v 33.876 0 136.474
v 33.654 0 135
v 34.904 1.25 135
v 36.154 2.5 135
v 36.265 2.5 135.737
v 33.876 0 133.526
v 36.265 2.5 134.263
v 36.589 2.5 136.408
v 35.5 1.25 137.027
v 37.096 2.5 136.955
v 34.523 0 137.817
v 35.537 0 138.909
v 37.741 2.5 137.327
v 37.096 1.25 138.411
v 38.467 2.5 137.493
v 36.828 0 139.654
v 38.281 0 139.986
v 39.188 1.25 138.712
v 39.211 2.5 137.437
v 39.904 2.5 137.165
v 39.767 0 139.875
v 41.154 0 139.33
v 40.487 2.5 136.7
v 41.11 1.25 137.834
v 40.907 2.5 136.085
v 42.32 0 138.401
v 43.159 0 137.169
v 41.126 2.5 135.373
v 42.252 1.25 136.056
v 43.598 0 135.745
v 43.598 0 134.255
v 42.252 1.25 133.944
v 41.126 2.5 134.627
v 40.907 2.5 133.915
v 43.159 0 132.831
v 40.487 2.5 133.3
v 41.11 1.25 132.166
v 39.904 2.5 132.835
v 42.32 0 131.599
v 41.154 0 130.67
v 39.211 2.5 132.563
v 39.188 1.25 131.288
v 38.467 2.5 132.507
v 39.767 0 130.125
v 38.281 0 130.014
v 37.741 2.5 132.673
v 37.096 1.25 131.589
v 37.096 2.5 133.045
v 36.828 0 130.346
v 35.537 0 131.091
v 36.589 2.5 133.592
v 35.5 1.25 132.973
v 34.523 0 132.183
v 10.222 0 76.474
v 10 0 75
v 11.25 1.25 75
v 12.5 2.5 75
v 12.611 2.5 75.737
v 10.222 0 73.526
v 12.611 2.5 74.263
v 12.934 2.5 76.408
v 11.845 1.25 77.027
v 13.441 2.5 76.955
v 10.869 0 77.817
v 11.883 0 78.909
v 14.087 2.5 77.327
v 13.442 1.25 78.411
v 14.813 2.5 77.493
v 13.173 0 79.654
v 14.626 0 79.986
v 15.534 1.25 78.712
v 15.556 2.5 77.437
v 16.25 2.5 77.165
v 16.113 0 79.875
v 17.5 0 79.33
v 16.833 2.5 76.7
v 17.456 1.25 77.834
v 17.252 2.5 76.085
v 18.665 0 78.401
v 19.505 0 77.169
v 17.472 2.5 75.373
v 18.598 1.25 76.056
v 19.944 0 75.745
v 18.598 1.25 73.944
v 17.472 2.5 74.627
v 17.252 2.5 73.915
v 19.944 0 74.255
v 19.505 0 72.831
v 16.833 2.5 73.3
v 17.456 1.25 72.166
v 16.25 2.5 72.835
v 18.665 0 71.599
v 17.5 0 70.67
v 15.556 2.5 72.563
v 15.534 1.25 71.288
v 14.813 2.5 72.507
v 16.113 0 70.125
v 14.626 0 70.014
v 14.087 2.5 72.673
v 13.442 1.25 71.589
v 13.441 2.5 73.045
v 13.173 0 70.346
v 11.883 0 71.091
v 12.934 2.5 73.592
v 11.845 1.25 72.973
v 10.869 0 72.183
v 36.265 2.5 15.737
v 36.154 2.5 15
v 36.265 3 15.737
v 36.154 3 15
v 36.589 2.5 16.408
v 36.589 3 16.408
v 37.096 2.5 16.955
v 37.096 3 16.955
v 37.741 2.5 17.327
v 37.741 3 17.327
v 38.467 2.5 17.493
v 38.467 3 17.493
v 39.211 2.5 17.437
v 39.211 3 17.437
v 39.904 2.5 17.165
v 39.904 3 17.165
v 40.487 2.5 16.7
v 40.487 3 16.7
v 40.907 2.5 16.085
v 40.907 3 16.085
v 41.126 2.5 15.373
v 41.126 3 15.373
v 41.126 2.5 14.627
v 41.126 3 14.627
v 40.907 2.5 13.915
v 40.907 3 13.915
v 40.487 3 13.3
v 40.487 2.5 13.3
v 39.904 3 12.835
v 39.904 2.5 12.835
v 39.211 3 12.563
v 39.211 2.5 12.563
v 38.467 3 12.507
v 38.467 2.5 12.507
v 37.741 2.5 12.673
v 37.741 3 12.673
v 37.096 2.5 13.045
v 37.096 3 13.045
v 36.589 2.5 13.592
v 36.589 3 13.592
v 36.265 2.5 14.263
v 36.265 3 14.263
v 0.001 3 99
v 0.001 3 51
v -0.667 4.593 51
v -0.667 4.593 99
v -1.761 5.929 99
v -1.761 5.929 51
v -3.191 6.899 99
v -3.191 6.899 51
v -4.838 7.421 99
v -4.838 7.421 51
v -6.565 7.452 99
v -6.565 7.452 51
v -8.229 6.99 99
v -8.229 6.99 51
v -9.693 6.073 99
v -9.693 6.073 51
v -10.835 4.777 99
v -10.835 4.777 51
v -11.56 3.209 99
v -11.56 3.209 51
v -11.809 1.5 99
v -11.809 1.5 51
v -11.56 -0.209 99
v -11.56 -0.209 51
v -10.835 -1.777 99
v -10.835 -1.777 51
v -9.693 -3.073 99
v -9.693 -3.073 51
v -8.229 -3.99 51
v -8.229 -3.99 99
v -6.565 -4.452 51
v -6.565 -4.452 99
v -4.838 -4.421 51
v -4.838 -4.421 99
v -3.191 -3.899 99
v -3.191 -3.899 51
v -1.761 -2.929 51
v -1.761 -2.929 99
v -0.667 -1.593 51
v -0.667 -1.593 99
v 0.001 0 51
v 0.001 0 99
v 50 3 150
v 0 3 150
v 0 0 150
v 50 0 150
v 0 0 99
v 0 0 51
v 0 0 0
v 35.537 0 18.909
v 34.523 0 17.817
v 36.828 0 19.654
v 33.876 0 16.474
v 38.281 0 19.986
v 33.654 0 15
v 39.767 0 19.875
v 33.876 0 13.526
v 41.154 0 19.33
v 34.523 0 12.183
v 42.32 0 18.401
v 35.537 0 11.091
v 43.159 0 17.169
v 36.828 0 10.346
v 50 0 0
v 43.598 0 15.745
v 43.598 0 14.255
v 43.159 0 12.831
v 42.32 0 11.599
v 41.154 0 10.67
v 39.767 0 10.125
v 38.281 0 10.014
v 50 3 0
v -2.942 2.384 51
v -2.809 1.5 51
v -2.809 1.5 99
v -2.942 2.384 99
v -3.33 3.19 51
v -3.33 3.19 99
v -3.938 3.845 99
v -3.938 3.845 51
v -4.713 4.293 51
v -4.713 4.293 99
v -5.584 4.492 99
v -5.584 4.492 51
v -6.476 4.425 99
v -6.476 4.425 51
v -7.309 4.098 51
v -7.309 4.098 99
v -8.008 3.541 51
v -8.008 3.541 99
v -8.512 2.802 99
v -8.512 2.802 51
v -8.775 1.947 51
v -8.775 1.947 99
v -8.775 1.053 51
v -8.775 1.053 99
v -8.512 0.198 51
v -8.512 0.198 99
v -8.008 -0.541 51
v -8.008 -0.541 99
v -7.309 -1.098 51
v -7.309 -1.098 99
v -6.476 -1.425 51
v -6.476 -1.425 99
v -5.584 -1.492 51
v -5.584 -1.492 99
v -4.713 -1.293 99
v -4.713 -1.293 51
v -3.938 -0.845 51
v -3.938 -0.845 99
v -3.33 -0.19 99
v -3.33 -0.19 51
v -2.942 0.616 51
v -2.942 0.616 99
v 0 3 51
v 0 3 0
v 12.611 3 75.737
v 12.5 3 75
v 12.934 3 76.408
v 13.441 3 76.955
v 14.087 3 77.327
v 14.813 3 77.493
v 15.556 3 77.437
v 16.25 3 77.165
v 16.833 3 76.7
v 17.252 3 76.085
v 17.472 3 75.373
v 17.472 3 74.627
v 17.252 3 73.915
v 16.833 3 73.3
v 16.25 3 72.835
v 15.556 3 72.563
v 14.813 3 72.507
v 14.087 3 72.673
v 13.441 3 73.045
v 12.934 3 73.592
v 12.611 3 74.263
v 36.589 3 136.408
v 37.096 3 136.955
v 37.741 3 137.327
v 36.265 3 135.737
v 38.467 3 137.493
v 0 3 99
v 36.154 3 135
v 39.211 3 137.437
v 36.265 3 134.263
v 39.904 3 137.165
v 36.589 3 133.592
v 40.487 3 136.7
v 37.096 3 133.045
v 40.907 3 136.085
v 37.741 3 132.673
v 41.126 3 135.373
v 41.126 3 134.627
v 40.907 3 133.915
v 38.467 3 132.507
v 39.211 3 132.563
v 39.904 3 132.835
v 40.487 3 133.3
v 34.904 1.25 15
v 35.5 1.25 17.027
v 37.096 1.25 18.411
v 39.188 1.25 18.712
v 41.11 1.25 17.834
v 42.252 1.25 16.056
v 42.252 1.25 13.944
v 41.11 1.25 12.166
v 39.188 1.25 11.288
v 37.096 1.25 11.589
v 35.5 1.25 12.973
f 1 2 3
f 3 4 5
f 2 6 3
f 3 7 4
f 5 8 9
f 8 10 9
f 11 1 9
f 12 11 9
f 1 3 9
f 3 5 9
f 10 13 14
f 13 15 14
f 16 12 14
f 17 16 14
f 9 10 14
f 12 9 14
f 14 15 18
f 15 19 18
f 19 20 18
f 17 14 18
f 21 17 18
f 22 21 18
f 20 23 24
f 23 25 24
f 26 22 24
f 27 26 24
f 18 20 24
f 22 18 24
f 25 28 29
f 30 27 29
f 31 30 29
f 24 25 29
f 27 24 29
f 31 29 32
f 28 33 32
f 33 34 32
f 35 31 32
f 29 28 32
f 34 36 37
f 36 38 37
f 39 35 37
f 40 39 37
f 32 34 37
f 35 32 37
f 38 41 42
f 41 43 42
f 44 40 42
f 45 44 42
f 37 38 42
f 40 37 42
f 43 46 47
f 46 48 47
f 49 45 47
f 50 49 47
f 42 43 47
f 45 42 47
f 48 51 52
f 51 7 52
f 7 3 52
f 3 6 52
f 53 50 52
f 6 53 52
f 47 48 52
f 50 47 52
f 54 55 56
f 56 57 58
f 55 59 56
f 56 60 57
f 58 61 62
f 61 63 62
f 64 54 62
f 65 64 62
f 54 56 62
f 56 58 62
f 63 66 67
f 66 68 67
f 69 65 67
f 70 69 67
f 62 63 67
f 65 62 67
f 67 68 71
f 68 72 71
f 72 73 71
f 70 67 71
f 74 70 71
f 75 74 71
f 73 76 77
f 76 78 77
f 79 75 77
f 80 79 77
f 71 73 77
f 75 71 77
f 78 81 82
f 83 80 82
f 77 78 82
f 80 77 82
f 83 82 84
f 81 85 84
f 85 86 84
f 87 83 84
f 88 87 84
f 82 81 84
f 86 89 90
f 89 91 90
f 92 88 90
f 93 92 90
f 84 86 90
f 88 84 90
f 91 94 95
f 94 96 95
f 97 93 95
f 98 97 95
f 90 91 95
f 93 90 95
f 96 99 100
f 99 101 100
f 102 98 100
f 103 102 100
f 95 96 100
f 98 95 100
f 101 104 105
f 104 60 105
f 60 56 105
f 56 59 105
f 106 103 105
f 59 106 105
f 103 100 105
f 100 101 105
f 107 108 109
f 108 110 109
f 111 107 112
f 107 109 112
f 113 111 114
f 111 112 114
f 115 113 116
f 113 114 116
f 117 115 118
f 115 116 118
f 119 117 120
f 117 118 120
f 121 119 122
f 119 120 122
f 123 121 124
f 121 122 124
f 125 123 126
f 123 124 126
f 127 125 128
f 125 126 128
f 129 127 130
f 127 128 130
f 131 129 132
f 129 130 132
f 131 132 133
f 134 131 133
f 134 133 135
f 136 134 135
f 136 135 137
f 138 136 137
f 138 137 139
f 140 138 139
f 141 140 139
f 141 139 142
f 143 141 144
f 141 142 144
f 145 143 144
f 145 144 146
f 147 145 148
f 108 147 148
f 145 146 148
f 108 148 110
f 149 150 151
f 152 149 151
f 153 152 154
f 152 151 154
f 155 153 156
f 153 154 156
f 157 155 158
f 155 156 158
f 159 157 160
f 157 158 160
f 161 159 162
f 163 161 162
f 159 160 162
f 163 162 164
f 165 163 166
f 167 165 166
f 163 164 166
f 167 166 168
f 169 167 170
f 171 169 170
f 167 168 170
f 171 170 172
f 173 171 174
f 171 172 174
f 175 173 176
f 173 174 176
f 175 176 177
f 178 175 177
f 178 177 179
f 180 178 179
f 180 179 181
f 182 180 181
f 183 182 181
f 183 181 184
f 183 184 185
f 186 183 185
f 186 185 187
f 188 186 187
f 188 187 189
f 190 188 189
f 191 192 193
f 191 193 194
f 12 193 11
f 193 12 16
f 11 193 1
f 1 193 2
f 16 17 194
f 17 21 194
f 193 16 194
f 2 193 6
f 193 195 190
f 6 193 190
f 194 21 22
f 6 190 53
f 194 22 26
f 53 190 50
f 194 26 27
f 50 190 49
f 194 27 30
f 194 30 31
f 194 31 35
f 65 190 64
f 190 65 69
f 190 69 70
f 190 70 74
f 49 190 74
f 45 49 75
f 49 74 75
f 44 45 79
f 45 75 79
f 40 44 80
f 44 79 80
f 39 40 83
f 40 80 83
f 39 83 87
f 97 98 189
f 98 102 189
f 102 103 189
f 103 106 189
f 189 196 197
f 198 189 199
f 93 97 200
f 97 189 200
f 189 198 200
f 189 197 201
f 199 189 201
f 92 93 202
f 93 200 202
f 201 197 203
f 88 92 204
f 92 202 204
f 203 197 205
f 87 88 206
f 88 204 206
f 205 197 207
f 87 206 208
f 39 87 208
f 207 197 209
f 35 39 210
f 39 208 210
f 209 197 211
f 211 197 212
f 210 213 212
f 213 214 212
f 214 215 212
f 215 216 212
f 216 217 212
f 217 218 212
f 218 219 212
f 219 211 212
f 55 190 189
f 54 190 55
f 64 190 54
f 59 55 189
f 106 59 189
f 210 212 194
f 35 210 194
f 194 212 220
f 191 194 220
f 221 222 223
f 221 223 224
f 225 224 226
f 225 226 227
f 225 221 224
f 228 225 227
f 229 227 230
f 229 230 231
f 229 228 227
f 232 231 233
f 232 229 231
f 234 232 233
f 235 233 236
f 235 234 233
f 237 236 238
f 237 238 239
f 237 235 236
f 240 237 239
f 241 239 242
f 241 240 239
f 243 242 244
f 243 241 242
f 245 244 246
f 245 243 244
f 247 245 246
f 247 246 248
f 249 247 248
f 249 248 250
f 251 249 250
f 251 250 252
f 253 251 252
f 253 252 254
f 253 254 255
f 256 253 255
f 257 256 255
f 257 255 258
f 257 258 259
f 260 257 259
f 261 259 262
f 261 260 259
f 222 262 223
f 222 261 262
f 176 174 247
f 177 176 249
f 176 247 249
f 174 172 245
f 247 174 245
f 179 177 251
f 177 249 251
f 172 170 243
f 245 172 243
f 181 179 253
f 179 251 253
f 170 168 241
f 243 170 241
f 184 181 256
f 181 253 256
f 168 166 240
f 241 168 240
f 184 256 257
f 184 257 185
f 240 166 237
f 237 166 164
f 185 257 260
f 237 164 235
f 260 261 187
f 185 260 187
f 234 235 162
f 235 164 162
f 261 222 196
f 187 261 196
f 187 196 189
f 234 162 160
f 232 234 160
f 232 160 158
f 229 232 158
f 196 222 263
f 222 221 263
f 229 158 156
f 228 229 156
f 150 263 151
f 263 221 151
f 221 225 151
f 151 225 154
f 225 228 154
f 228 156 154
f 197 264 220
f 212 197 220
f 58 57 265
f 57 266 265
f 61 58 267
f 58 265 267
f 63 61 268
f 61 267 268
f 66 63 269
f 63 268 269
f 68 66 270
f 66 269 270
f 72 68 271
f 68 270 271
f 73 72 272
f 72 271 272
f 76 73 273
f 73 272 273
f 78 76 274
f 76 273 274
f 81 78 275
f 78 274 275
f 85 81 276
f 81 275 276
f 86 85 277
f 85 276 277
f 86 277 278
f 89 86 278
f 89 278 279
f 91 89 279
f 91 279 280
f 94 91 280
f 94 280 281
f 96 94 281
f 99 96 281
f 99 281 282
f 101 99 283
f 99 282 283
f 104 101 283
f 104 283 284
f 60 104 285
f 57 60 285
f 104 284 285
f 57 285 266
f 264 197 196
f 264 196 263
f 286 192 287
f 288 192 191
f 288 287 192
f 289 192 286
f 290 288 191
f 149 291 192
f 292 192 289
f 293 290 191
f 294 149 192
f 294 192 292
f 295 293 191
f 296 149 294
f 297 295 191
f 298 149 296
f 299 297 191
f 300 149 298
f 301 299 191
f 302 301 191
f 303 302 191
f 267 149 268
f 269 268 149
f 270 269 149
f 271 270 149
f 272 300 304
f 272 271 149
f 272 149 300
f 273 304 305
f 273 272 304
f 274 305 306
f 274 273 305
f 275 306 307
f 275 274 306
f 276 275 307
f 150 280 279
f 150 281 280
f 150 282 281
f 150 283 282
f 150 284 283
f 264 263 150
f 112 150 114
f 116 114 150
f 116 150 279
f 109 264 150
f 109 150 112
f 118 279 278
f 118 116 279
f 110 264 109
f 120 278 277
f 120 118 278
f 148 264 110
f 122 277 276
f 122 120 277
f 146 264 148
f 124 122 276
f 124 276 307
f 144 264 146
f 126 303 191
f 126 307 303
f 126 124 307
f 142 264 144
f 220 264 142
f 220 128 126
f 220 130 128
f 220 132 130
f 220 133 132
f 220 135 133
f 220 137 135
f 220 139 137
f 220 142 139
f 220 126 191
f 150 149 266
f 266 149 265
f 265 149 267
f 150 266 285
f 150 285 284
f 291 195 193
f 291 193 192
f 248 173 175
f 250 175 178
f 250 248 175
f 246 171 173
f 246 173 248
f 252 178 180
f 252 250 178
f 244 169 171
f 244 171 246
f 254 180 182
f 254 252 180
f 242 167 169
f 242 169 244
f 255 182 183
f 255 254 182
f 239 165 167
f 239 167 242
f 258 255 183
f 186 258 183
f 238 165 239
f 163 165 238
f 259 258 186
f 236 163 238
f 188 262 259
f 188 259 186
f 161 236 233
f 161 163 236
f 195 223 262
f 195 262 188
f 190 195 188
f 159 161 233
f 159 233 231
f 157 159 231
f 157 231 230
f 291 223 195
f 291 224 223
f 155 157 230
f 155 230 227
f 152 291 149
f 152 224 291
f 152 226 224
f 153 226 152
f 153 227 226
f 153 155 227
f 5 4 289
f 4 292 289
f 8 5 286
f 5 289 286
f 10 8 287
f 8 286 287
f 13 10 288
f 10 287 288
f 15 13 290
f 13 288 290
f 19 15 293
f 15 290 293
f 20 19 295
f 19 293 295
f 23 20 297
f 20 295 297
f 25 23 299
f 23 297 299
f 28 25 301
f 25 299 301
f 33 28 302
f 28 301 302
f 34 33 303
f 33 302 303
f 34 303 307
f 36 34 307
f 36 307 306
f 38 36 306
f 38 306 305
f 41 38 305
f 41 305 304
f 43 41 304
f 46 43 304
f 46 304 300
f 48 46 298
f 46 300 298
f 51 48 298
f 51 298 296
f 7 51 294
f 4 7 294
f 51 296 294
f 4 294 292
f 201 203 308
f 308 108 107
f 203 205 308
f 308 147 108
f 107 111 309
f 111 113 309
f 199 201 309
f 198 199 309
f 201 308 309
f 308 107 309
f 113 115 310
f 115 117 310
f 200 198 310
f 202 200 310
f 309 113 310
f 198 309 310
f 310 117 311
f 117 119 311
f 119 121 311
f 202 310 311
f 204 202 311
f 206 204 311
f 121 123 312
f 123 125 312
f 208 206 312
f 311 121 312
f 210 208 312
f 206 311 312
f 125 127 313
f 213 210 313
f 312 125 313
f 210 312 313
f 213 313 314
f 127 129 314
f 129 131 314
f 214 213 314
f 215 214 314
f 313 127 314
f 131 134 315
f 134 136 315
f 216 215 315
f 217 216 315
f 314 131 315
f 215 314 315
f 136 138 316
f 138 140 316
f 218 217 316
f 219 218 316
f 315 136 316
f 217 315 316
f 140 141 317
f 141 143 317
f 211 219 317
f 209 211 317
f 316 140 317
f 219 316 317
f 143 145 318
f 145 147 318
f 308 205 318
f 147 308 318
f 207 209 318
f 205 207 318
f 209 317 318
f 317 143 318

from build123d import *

# Parameters (mm, degrees)
F0_W           = 50
F0_H           = 3
F1_DEPTH       = 150
F3_START       = 51
F2_R           = 6
F2_R_2         = 3
F3_DEPTH       = 48
F5_D           = 5
F5_CSINK_D     = 10
F5_CSINK_ANGLE = 90


# Not quite as in the source:
# - a feature names something its author has since deleted; it is built from what else it names


with BuildPart() as f1:
    # F0 (on Top) → F1 (new body)
    with BuildSketch(Plane.XY):
        with Locations((25, 1.5)):
            Rectangle(F0_W, F0_H)
    extrude(amount=F1_DEPTH)

    # F2 (on Top) → F3 (join)
    with BuildSketch(Plane.XY.offset(F3_START)):
        with Locations((-5.8086630434, 1.5)):
            Circle(F2_R)
        with Locations((-5.8086630434, 1.5)):
            Circle(F2_R_2, mode=Mode.SUBTRACT)
    extrude(amount=F3_DEPTH)

    # F5 (through all)
    with Locations(Plane.XZ):
        with Locations((38.6542826891, 135), (15, 75), (38.6542826891, 15)):
            CounterSinkHole(F5_D / 2, F5_CSINK_D / 2, counter_sink_angle=F5_CSINK_ANGLE)


solid = f1.part
